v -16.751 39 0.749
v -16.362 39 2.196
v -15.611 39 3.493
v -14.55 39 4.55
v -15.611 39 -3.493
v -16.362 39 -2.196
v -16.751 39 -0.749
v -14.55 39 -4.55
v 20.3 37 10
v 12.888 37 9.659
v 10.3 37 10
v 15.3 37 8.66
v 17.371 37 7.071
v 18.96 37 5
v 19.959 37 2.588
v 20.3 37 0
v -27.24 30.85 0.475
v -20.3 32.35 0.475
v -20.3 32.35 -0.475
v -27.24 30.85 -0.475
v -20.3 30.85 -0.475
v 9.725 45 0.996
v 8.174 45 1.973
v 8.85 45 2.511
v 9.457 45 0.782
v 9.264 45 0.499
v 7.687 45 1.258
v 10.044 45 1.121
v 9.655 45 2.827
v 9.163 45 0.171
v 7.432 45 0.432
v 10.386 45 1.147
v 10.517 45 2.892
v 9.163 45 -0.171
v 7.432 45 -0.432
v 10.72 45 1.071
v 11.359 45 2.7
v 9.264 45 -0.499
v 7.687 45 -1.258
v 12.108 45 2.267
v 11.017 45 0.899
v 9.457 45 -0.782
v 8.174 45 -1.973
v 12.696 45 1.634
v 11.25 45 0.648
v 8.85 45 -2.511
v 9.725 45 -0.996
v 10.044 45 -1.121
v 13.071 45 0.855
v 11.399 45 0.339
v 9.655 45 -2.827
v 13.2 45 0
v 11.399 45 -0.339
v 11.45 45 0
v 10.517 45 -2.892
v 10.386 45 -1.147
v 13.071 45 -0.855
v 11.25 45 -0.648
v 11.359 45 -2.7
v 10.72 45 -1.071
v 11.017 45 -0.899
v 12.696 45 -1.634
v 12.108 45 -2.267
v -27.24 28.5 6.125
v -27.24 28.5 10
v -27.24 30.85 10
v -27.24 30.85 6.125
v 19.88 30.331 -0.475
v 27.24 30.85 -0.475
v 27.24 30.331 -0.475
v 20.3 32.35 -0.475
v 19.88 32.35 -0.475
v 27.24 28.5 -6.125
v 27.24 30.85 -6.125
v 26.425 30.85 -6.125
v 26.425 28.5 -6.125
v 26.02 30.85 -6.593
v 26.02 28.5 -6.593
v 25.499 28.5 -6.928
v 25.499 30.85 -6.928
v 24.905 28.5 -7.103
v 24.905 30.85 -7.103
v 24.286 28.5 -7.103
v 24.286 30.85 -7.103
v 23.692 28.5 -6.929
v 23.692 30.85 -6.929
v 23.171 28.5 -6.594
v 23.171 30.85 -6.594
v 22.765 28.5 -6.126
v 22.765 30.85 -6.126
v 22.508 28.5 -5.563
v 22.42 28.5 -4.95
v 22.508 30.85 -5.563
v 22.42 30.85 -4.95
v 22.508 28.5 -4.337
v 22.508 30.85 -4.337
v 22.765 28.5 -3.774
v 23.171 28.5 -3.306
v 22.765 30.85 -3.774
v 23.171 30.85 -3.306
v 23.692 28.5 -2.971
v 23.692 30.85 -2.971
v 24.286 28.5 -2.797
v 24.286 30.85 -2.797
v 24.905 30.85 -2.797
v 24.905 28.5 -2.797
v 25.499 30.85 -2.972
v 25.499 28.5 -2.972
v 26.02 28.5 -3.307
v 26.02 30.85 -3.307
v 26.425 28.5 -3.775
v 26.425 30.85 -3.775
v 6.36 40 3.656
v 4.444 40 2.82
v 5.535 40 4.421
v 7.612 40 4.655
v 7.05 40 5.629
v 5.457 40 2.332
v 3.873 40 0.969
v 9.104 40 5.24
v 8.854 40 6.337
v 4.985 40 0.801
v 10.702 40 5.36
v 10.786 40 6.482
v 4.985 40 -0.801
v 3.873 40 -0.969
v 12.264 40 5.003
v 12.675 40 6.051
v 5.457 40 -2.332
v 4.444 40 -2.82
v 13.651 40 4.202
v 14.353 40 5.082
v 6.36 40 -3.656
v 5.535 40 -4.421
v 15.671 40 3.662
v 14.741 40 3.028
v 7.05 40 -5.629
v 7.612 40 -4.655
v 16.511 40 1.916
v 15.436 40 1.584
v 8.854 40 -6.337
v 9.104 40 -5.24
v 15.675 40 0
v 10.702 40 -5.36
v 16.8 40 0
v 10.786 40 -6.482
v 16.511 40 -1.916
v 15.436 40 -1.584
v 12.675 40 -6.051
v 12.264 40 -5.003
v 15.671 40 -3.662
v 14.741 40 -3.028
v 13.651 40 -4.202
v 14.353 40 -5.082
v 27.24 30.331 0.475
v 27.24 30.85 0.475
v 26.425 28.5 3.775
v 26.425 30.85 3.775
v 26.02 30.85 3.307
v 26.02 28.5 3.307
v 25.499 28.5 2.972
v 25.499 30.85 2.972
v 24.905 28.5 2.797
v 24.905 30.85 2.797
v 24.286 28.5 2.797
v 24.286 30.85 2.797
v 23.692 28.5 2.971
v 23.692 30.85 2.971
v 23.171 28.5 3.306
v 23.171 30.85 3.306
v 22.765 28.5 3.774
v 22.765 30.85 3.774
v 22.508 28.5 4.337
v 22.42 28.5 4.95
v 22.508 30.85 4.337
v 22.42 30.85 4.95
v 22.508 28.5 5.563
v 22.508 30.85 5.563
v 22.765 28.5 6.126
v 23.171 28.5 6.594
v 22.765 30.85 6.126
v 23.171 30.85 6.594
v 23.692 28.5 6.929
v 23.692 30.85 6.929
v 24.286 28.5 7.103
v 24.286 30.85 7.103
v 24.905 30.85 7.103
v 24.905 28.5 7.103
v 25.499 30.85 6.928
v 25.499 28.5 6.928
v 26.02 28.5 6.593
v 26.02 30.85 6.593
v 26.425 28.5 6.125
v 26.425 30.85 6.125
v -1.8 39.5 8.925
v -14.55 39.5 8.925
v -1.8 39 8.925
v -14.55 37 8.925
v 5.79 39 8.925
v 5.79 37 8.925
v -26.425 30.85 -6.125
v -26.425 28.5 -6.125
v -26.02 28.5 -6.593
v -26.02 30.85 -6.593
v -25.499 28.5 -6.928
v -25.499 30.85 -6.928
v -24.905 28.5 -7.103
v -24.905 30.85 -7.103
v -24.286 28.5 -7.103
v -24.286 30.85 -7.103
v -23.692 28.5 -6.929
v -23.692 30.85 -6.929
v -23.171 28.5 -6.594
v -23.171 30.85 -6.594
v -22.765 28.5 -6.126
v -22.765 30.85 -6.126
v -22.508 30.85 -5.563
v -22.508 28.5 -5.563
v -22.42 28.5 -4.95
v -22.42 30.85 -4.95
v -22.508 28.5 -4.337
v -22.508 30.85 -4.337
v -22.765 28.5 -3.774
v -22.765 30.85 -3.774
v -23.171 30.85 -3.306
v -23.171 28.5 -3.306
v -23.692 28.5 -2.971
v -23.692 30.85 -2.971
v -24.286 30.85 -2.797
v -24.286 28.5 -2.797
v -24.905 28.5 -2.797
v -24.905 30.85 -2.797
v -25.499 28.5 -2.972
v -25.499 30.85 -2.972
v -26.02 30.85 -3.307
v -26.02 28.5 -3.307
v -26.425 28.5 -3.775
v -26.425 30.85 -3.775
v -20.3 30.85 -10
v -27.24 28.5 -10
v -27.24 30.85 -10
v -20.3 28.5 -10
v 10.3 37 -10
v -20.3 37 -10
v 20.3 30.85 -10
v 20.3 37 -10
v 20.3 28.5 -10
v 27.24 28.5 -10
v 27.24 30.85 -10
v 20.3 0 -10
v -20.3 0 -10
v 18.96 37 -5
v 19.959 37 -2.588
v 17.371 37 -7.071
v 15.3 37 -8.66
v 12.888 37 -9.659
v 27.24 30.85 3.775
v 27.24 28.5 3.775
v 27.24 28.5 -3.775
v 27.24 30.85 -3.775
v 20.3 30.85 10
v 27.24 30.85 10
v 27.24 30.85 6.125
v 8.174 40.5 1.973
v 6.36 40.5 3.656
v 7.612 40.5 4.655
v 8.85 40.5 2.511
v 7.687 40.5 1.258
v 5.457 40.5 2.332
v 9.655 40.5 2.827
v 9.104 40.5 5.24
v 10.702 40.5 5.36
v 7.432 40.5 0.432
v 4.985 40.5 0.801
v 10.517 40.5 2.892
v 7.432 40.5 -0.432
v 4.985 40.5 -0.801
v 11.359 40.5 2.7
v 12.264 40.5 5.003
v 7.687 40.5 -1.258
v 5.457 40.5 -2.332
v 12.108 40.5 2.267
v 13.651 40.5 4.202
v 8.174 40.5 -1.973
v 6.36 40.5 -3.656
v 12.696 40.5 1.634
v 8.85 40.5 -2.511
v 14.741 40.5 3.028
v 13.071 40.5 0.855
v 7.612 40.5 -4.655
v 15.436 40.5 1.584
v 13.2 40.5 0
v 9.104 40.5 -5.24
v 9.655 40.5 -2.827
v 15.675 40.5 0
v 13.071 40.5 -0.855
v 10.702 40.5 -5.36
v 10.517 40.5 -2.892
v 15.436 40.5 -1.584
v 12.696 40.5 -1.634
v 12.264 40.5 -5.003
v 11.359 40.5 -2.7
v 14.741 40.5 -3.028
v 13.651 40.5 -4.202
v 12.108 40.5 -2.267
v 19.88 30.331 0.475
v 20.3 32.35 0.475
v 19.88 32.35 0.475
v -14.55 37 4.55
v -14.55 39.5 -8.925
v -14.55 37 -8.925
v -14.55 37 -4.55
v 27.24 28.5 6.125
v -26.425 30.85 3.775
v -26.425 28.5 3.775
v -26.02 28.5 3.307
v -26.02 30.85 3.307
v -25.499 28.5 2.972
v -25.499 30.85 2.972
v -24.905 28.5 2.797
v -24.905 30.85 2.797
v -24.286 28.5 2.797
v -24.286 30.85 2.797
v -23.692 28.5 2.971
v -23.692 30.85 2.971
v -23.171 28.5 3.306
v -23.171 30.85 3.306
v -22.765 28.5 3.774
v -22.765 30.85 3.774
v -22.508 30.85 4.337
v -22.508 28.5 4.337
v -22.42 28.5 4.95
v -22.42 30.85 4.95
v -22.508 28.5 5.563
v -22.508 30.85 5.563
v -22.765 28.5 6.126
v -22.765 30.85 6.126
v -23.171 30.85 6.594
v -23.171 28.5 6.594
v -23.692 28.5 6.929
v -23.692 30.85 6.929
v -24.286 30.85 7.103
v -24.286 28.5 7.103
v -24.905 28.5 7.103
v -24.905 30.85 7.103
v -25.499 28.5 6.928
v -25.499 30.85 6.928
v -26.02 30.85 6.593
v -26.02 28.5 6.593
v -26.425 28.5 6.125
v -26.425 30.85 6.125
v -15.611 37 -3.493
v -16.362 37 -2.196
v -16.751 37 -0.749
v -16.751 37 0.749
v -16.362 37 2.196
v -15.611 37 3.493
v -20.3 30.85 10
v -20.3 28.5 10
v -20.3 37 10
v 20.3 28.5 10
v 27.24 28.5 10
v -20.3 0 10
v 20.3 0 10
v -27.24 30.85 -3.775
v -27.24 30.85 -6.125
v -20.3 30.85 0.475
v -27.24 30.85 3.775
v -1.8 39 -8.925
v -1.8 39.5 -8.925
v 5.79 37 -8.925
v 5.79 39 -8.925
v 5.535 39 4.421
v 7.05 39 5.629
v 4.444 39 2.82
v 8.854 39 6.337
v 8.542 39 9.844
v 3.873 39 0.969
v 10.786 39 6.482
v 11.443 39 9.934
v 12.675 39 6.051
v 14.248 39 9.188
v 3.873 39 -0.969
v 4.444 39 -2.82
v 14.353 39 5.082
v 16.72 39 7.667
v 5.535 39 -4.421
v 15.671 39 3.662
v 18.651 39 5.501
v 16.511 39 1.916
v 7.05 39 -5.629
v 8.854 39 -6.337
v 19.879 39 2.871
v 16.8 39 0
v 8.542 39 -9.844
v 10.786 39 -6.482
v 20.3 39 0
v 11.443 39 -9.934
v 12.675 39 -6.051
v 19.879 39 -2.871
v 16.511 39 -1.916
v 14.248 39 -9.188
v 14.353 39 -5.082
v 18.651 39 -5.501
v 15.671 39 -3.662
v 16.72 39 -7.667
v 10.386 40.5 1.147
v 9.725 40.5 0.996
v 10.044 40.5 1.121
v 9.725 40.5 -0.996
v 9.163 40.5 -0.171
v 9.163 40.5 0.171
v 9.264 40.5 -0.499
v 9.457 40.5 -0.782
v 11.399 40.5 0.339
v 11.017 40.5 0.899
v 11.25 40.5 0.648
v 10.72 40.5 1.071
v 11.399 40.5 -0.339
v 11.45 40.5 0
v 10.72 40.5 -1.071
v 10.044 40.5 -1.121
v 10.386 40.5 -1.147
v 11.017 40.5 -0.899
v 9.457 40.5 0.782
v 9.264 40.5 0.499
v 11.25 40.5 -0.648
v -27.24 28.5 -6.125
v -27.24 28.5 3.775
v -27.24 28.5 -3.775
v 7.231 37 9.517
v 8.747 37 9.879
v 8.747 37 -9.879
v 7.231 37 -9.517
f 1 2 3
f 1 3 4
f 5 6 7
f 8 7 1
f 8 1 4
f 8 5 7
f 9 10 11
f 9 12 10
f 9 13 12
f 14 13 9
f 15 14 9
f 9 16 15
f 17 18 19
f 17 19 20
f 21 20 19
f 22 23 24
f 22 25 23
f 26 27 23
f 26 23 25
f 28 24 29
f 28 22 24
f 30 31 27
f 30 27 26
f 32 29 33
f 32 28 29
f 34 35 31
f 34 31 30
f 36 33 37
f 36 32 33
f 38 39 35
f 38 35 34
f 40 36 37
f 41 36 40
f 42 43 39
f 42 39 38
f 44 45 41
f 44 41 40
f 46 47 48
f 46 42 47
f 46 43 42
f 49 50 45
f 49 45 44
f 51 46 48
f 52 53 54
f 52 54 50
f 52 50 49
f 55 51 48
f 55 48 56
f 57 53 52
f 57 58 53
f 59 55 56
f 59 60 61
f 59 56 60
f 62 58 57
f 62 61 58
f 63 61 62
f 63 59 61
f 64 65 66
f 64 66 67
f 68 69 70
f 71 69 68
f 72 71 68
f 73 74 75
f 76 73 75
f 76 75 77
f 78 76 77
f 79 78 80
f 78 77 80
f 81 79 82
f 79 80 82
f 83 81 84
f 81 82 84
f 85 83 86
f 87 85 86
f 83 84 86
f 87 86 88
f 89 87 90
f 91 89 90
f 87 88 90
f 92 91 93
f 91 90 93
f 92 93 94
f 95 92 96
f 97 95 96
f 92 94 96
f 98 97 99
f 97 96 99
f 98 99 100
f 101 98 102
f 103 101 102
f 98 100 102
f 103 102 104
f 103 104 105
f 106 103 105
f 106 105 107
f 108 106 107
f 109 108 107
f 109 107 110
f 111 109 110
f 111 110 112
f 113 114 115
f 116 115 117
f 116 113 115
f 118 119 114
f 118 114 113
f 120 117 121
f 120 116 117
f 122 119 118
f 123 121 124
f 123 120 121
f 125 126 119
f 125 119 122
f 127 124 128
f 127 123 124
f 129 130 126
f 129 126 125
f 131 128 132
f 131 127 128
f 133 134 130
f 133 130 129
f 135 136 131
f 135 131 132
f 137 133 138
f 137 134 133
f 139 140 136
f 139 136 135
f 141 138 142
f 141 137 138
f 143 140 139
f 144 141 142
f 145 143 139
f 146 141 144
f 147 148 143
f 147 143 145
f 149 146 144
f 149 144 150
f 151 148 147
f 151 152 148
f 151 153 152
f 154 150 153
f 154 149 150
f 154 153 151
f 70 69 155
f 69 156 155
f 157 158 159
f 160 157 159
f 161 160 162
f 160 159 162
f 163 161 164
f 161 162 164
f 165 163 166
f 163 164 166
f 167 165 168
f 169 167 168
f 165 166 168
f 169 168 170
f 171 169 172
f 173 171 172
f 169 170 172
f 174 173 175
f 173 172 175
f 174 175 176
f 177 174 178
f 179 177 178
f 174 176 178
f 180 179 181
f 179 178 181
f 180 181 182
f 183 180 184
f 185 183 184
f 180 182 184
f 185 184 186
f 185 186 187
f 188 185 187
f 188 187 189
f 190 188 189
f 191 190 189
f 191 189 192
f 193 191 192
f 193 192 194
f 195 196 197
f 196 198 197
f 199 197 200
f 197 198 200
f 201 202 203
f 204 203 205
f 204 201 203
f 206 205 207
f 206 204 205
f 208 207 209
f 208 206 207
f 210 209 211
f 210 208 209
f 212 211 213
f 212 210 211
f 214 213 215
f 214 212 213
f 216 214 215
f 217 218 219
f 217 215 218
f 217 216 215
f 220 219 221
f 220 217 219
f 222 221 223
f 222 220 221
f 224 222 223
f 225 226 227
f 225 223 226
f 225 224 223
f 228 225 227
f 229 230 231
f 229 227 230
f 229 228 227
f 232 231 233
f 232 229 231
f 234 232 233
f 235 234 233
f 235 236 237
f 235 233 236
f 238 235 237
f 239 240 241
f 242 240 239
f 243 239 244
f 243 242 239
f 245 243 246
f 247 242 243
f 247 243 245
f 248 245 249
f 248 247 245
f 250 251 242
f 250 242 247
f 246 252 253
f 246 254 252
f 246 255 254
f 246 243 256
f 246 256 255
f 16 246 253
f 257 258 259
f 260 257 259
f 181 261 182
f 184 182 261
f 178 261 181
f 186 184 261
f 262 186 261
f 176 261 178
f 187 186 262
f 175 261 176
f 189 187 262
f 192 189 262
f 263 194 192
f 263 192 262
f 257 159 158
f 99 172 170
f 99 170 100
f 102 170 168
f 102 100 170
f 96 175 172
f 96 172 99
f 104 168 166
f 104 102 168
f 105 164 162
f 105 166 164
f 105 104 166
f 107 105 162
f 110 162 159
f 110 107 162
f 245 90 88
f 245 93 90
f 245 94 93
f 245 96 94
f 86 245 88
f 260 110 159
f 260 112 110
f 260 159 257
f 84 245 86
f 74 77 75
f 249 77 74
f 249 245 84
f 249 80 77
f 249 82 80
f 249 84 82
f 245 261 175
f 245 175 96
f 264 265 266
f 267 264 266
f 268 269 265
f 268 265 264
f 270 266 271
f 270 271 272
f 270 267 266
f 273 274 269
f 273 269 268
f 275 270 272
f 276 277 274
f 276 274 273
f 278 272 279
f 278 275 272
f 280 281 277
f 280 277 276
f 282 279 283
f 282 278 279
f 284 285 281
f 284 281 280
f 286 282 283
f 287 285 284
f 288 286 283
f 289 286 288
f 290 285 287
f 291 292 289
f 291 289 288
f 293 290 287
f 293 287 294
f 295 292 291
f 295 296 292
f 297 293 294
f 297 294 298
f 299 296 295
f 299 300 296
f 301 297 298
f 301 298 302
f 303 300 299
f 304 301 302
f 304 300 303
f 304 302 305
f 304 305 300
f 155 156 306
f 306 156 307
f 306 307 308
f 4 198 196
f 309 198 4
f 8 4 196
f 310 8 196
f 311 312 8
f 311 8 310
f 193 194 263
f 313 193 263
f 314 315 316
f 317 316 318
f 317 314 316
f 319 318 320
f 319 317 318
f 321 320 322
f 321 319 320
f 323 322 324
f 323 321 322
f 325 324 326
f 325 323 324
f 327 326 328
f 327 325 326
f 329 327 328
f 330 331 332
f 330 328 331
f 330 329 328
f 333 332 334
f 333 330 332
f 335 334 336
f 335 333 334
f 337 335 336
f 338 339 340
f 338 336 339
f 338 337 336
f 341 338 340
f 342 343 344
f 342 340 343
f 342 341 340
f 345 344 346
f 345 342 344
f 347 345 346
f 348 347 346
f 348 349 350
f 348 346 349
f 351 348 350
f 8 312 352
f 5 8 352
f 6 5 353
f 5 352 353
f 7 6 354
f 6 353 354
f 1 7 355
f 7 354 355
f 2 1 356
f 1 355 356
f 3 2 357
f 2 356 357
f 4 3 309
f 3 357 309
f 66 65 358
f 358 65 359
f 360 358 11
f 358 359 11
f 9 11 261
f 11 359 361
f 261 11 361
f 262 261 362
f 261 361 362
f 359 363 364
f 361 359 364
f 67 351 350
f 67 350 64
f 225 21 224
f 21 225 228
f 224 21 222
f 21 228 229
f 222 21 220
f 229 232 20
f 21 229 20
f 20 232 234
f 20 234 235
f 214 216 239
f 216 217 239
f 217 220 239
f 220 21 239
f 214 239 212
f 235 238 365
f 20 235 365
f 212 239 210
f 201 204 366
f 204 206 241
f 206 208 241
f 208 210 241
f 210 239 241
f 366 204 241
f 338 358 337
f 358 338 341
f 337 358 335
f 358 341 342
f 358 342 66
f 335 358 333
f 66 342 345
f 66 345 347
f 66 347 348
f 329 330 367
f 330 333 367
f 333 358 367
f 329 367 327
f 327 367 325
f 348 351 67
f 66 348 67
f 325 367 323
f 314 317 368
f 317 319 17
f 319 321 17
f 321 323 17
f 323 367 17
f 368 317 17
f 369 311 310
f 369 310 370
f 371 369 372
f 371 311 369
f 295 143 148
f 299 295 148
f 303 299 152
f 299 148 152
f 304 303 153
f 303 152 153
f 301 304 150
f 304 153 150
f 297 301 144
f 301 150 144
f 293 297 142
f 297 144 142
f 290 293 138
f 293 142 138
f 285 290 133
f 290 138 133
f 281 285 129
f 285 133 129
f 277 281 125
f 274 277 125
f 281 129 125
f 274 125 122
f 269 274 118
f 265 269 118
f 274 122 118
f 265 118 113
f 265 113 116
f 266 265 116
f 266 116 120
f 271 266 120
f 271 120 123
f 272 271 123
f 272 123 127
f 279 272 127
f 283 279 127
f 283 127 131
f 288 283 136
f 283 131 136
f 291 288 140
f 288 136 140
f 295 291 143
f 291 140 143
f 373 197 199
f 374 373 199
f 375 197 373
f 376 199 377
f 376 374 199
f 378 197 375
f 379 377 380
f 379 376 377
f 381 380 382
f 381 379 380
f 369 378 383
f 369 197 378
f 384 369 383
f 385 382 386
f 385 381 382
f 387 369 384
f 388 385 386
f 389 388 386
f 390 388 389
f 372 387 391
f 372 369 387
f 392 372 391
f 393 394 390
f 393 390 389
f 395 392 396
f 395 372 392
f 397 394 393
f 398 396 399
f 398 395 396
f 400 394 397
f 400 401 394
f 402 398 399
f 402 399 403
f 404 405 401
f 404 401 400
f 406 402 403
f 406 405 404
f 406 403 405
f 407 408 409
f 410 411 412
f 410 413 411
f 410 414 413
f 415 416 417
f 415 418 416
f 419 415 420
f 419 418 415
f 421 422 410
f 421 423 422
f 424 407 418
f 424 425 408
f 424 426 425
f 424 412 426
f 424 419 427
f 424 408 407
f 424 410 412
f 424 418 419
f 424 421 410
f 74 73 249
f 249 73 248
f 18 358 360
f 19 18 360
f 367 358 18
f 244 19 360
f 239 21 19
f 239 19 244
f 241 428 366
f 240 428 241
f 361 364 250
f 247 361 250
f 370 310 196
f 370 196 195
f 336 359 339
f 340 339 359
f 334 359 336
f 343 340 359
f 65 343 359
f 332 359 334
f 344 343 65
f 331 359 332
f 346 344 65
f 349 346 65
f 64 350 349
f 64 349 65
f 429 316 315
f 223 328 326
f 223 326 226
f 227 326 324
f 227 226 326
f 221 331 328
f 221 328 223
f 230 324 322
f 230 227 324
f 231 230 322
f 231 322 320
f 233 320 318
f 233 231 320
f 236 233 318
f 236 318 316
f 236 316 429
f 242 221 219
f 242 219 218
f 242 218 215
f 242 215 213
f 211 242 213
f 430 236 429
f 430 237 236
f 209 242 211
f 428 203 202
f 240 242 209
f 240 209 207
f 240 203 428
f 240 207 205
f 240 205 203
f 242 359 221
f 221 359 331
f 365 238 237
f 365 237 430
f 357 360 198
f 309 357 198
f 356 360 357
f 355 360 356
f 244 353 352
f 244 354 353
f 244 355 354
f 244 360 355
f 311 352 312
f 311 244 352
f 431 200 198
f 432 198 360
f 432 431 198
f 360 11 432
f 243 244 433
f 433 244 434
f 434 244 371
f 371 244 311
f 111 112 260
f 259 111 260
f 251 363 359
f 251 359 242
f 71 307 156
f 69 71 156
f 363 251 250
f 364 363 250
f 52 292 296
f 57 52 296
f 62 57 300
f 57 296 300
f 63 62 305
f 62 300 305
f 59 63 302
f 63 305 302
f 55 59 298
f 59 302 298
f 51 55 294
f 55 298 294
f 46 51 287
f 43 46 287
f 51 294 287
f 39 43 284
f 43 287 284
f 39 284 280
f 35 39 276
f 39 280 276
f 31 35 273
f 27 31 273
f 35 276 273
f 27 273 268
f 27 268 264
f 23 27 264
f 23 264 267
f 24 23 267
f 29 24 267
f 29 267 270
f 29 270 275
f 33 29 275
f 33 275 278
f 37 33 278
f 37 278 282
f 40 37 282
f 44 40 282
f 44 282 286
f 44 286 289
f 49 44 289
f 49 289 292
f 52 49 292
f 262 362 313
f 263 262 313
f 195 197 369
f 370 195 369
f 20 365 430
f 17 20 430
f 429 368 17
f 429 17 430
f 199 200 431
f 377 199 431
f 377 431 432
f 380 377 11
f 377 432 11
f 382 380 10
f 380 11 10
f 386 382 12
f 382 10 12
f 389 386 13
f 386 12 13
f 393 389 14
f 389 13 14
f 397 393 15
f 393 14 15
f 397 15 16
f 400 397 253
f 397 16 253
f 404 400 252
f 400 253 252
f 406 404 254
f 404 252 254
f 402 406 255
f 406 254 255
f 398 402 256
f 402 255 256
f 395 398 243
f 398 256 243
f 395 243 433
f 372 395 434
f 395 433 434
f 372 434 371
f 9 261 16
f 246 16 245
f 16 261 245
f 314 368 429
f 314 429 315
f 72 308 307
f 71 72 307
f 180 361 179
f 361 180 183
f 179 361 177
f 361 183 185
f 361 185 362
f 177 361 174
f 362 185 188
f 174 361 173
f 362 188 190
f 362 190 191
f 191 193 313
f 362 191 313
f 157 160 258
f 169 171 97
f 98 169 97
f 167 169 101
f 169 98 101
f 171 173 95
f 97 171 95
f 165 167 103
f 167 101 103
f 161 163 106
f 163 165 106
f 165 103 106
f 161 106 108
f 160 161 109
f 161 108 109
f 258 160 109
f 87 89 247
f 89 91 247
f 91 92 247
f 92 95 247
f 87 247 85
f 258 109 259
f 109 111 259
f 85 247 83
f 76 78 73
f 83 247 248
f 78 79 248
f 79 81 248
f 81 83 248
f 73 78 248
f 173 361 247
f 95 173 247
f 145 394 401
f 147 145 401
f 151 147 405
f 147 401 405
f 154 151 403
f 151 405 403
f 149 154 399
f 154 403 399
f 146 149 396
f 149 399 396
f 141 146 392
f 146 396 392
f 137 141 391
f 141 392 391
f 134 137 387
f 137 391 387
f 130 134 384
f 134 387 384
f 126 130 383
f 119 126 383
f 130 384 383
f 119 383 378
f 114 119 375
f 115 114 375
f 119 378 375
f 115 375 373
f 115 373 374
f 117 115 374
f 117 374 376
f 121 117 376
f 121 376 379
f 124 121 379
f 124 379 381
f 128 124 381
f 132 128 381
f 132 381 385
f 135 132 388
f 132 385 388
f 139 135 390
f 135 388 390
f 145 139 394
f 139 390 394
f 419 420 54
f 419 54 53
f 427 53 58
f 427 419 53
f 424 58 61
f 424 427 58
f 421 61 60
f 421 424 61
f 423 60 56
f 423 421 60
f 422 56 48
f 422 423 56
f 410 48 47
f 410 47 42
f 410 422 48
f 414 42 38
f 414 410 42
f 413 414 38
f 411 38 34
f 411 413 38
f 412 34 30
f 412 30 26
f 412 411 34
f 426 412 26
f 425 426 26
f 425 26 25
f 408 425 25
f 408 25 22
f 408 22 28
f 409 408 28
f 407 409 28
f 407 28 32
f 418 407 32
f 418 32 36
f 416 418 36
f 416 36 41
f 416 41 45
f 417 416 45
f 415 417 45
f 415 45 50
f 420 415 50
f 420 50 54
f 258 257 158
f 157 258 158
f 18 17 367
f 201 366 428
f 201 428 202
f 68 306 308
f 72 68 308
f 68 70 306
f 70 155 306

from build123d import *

# Parameters (mm, degrees)
SKETCH1_W           = 40.6
SKETCH1_H           = 20
BOSS_EXTRUDE1_DEPTH = 37
BOSS_EXTRUDE2_START = 28.5
SKETCH2_W           = 6.94
SKETCH2_H           = 20
BOSS_EXTRUDE2_DEPTH = 2.35
BOSS_EXTRUDE8_DEPTH = 0.475
SKETCH3_W           = 2.645
SKETCH3_H           = 2.35
CUT_EXTRUDE2_DEPTH  = 31.85
BOSS_EXTRUDE4_DEPTH = 2
SKETCH6_W           = 12.75
SKETCH6_H           = 17.85
BOSS_EXTRUDE5_DEPTH = 0.5
SKETCH7_R           = 6.5
BOSS_EXTRUDE6_DEPTH = 1
SKETCH8_R           = 5.375
BOSS_EXTRUDE7_DEPTH = 0.5
BOSS_EXTRUDE3_START = 2
SKETCH4_R           = 2.9
SKETCH4_R_2         = 1.15
BOSS_EXTRUDE3_DEPTH = 6


with BuildPart() as part:
    # Sketch1 → Boss-Extrude1 (new body)
    with BuildSketch(Plane(origin=(0, 0, 0), x_dir=(1, 0, 0), z_dir=(0, 1, 0))):
        Rectangle(SKETCH1_W, SKETCH1_H)
    extrude(amount=BOSS_EXTRUDE1_DEPTH)

    # Sketch2 → Boss-Extrude2 (add)
    with BuildSketch(Plane(origin=(0, 0, 0), x_dir=(1, 0, 0), z_dir=(0, 1, 0)).offset(BOSS_EXTRUDE2_START)):
        with Locations((23.77, 0)):
            Rectangle(SKETCH2_W, SKETCH2_H)
    boss_extrude2 = extrude(amount=BOSS_EXTRUDE2_DEPTH)

    # Sketch3 → Cut-Extrude2 (cut, through all)
    with BuildSketch(Plane(origin=(0, 30.85, 0), x_dir=(1, 0, 0), z_dir=(0, 1, 0))):
        with BuildLine():
            ThreePointArc((26.425300522, 6.125), (22.42, 4.95), (26.425300522, 3.775))
            Line((26.425300522, 3.775), (24.595, 3.775))
            Line((24.595, 3.775), (24.595, 6.125))
            Line((24.595, 6.125), (26.425300522, 6.125))
        make_face()
        with BuildLine():
            Line((24.595, 3.775), (26.425300522, 3.775))
            ThreePointArc((26.425300522, 3.775), (26.682046793, 4.337741327), (26.77, 4.95))
            ThreePointArc((26.77, 4.95), (26.682046793, 5.562258673), (26.425300522, 6.125))
            Line((26.425300522, 6.125), (24.595, 6.125))
            Line((24.595, 6.125), (24.595, 3.775))
        make_face()
        with Locations((28.5625, 4.95)):
            Rectangle(SKETCH3_W, SKETCH3_H)
        with BuildLine():
            Line((26.425300522, 3.775), (27.24, 3.775))
            Line((27.24, 3.775), (27.24, 6.125))
            Line((27.24, 6.125), (26.425300522, 6.125))
            ThreePointArc((26.425300522, 6.125), (26.682046793, 5.562258673), (26.77, 4.95))
            ThreePointArc((26.77, 4.95), (26.682046793, 4.337741327), (26.425300522, 3.775))
        make_face()
        with BuildLine():
            ThreePointArc((26.425300522, -3.775), (22.42, -4.95), (26.425300522, -6.125))
            Line((26.425300522, -6.125), (24.595, -6.125))
            Line((24.595, -6.125), (24.595, -3.775))
            Line((24.595, -3.775), (26.425300522, -3.775))
        make_face()
        with BuildLine():
            Line((24.595, -6.125), (26.425300522, -6.125))
            ThreePointArc((26.425300522, -6.125), (26.682046793, -5.562258673), (26.77, -4.95))
            ThreePointArc((26.77, -4.95), (26.682046793, -4.337741327), (26.425300522, -3.775))
            Line((26.425300522, -3.775), (24.595, -3.775))
            Line((24.595, -3.775), (24.595, -6.125))
        make_face()
        with Locations((28.5625, -4.95)):
            Rectangle(SKETCH3_W, SKETCH3_H)
        with BuildLine():
            Line((26.425300522, -6.125), (27.24, -6.125))
            Line((27.24, -6.125), (27.24, -3.775))
            Line((27.24, -3.775), (26.425300522, -3.775))
            ThreePointArc((26.425300522, -3.775), (26.682046793, -4.337741327), (26.77, -4.95))
            ThreePointArc((26.77, -4.95), (26.682046793, -5.562258673), (26.425300522, -6.125))
        make_face()
    cut_extrude2 = extrude(amount=-CUT_EXTRUDE2_DEPTH, mode=Mode.SUBTRACT)

    # Mirror2: Boss-Extrude2, Cut-Extrude2 across plane
    add(boss_extrude2.mirror(Plane(origin=(0, 0, 0), x_dir=(0, 0, 1), z_dir=(1, 0, 0))))
    add(cut_extrude2.mirror(Plane(origin=(0, 0, 0), x_dir=(0, 0, 1), z_dir=(1, 0, 0))), mode=Mode.SUBTRACT)


with BuildPart() as body_2:
    # Sketch10 → Boss-Extrude8 (new body, symmetric)
    with BuildSketch(Plane.XY):
        Polygon((20.3, 32.35), (27.24, 30.85), (27.24, 30.331456629), (19.880126177, 30.331456629), (19.880126177, 32.35), align=None)
    boss_extrude8 = extrude(amount=BOSS_EXTRUDE8_DEPTH, both=True)


with BuildPart() as part_1:
    add(part.part)

    # Mirror6: Boss-Extrude8 across plane
    add(boss_extrude8.mirror(Plane(origin=(0, 0, 0), x_dir=(0, 0, 1), z_dir=(1, 0, 0))))

    # Sketch5 → Boss-Extrude4 (add)
    with BuildSketch(Plane(origin=(0, 37, 0), x_dir=(1, 0, 0), z_dir=(0, 1, 0))):
        with BuildLine():
            Line((-14.55, -4.55), (-14.55, -8.925))
            Line((-14.55, -8.925), (5.789526078, -8.925))
            ThreePointArc((5.789526078, -8.925), (20.3, 0), (5.789526078, 8.925))
            Line((5.789526078, 8.925), (-14.55, 8.925))
            Line((-14.55, 8.925), (-14.55, 4.55))
            ThreePointArc((-14.55, 4.55), (-16.8, 0), (-14.55, -4.55))
        make_face()
    extrude(amount=BOSS_EXTRUDE4_DEPTH)

    # Sketch6 → Boss-Extrude5 (add)
    with BuildSketch(Plane(origin=(0, 39, 0), x_dir=(1, 0, 0), z_dir=(0, 1, 0))):
        with Locations((-8.175, 0)):
            Rectangle(SKETCH6_W, SKETCH6_H)
    extrude(amount=BOSS_EXTRUDE5_DEPTH)

    # Sketch7 → Boss-Extrude6 (add)
    with BuildSketch(Plane(origin=(0, 39, 0), x_dir=(1, 0, 0), z_dir=(0, 1, 0))):
        with Locations((10.3, 0)):
            Circle(SKETCH7_R)
    extrude(amount=BOSS_EXTRUDE6_DEPTH)

    # Sketch8 → Boss-Extrude7 (add)
    with BuildSketch(Plane(origin=(0, 40, 0), x_dir=(1, 0, 0), z_dir=(0, 1, 0))):
        with Locations((10.3, 0)):
            Circle(SKETCH8_R)
    extrude(amount=BOSS_EXTRUDE7_DEPTH)

    # Sketch4 → Boss-Extrude3 (add)
    with BuildSketch(Plane(origin=(0, 37, 0), x_dir=(1, 0, 0), z_dir=(0, 1, 0)).offset(BOSS_EXTRUDE3_START)):
        with Locations((10.3, 0)):
            Circle(SKETCH4_R)
        with Locations((10.3, 0)):
            Circle(SKETCH4_R_2, mode=Mode.SUBTRACT)
    extrude(amount=BOSS_EXTRUDE3_DEPTH)


solid = Compound([body_2.part, part_1.part])
